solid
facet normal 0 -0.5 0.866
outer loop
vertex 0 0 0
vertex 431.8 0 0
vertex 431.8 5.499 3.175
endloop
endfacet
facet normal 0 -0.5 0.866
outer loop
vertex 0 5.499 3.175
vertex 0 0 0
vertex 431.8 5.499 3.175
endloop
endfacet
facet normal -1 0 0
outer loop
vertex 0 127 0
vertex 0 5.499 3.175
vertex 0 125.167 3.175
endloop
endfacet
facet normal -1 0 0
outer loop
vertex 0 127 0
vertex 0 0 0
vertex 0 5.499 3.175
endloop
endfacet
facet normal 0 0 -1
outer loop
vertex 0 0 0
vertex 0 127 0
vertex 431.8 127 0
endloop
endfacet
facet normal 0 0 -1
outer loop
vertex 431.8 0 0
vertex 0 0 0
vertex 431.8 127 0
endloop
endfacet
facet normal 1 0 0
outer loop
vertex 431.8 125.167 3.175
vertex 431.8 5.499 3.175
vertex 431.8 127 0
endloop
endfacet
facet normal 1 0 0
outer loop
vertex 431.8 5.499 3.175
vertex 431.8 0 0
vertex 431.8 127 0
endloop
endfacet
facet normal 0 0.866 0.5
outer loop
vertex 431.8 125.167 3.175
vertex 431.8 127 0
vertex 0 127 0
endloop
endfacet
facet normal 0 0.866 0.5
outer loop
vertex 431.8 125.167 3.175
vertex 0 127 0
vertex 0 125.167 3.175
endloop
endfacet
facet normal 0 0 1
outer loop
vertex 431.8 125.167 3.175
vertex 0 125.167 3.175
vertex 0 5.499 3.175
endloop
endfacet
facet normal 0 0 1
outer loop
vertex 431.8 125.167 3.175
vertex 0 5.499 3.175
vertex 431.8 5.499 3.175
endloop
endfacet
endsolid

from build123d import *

# Parameters (mm, degrees)
SKETCH2_W               = 431.8
SKETCH2_H               = 127
BOSS_EXTRUDE1_DEPTH     = 3.175
CUT_EXTRUDE1_DEPTH      = 451.100345062
CUT_EXTRUDE1_DEPTH_BACK = 451.100345062
CUT_EXTRUDE2_DEPTH      = 451.100345062
CUT_EXTRUDE2_DEPTH_BACK = 451.100345062


with BuildPart() as part:
    # Sketch2 → Boss-Extrude1 (new body)
    with BuildSketch(Plane.XY):
        with Locations((215.9, 63.5)):
            Rectangle(SKETCH2_W, SKETCH2_H)
    extrude(amount=BOSS_EXTRUDE1_DEPTH)

    # Sketch3 → Cut-Extrude1 (cut, two sides: drawn at the far end of the back side and taken through both)
    with BuildSketch(Plane.ZY.offset(-CUT_EXTRUDE1_DEPTH_BACK)):
        Polygon((-132.039681301, -228.699436628), (0, 0), (3.175, 5.499261314), (135.214681301, 234.198697942), (592.613554557, -29.880664659), (325.359191955, -492.77879923), align=None)
    extrude(amount=CUT_EXTRUDE1_DEPTH + CUT_EXTRUDE1_DEPTH_BACK, mode=Mode.SUBTRACT)

    # Sketch4 → Cut-Extrude2 (cut, two sides: drawn at the far end of the back side and taken through both)
    with BuildSketch(Plane(origin=(431.8, 0, 0), x_dir=(0, 0, -1), z_dir=(1, 0, 0)).offset(-CUT_EXTRUDE2_DEPTH_BACK)):
        Polygon((228.699436628, 259.039681301), (0, 127), (-3.175, 125.166912895), (-231.874436628, -6.872768405), (-495.95379923, 450.526104851), (-35.379925973, 716.438554557), align=None)
    extrude(amount=CUT_EXTRUDE2_DEPTH + CUT_EXTRUDE2_DEPTH_BACK, mode=Mode.SUBTRACT)


solid = part.part
